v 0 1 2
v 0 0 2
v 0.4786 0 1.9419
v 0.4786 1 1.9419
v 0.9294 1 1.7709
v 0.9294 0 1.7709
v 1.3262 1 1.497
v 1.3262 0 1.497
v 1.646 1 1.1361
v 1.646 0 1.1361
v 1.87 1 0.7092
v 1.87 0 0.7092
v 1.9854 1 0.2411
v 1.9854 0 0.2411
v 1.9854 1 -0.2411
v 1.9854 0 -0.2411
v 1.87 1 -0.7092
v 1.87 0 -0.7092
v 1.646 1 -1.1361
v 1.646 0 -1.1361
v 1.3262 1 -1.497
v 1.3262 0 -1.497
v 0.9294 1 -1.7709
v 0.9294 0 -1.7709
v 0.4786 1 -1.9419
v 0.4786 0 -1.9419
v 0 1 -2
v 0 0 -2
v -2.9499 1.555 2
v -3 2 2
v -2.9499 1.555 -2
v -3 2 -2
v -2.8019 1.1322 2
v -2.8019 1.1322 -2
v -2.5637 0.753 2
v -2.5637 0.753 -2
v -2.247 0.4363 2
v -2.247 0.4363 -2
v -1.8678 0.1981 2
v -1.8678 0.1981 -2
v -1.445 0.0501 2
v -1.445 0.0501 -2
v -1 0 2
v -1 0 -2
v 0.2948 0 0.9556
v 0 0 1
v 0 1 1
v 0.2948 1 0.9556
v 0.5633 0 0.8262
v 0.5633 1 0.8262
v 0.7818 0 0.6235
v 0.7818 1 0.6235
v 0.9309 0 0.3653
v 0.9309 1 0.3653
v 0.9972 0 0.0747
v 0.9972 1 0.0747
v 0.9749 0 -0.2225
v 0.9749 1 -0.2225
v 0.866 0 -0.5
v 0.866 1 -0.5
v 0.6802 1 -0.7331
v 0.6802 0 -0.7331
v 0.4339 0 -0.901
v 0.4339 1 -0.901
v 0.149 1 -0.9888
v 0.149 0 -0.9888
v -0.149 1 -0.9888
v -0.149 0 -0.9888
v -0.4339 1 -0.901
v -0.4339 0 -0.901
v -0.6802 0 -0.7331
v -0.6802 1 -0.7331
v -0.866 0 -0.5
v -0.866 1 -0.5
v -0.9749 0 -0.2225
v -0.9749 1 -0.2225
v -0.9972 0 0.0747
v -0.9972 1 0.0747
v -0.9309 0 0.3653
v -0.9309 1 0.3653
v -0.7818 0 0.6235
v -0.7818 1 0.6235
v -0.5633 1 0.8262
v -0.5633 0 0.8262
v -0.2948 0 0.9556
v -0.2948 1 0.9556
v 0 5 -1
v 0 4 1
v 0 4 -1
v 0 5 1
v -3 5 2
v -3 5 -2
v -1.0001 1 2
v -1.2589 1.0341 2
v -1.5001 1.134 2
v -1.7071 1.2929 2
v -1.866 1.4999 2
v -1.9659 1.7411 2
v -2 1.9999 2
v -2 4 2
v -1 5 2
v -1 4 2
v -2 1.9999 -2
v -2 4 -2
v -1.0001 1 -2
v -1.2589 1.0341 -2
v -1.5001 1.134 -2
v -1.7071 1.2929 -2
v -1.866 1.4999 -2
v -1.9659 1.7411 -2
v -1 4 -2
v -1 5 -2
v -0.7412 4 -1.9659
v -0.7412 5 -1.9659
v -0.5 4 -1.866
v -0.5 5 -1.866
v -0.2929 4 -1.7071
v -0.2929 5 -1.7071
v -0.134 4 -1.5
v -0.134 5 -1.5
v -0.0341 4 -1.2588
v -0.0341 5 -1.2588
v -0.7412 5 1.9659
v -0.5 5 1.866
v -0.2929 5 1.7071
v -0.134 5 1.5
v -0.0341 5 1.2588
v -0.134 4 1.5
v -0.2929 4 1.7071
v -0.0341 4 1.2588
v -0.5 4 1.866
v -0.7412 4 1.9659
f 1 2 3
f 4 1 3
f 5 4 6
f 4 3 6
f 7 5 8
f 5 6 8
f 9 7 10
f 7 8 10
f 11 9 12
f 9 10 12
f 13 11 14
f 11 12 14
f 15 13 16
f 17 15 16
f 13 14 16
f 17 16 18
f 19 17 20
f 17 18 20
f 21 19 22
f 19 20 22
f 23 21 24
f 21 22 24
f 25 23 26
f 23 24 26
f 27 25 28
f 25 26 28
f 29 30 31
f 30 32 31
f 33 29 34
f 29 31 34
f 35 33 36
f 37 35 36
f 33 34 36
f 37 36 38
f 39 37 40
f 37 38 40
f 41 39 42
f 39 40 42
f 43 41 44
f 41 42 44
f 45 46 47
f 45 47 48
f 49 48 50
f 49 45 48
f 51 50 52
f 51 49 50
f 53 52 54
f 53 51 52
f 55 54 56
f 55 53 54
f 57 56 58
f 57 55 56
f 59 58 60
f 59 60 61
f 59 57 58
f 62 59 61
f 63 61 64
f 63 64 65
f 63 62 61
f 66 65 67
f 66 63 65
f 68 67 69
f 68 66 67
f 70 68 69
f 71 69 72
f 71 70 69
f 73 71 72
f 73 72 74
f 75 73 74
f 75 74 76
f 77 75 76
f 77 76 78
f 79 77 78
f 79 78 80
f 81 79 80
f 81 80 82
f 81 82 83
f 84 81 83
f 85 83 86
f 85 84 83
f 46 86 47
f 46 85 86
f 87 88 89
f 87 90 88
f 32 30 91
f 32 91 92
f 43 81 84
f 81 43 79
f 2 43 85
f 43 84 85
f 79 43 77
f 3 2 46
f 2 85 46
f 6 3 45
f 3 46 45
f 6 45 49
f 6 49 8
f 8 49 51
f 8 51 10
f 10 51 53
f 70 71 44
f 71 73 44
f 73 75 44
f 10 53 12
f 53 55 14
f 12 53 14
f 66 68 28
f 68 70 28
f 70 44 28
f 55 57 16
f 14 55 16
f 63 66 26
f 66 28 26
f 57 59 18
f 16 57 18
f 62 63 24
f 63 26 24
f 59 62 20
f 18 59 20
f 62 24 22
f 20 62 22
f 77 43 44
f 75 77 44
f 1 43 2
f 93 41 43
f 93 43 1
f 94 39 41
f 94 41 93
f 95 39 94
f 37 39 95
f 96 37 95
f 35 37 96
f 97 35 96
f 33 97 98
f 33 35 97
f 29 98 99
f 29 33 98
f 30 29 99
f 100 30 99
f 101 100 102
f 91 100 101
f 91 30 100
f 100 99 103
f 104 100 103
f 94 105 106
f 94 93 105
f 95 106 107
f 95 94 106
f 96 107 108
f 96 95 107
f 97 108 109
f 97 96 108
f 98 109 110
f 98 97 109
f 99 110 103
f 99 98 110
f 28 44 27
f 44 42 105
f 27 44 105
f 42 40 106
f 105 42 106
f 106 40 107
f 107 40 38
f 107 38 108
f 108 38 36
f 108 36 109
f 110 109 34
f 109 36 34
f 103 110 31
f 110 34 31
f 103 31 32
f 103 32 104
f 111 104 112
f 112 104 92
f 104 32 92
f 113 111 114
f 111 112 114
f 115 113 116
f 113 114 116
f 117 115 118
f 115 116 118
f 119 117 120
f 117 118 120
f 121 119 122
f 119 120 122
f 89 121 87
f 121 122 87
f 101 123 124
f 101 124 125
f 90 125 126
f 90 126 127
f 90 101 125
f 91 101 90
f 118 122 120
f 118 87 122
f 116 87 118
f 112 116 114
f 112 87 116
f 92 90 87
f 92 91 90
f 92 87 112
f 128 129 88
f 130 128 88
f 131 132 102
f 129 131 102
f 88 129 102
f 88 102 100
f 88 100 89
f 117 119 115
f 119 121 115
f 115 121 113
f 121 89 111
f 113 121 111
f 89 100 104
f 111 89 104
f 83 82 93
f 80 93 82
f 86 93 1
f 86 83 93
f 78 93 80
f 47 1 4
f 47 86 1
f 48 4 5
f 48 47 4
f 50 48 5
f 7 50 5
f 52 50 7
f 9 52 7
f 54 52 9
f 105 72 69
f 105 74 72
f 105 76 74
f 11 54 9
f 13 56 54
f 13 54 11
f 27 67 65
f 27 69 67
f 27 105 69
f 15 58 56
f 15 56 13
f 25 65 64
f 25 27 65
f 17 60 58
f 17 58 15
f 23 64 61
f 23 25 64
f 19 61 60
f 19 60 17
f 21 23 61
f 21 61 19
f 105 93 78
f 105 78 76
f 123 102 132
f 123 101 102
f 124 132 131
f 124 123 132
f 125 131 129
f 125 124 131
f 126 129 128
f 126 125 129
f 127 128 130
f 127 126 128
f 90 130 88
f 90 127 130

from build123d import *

# Parameters (mm, degrees)
SKETCH_1_R      = 1
EXTRUDE_1_DEPTH = 1
SKETCH_1_3_W    = 1
SKETCH_1_3_H    = 4
EXTRUDE_2_DEPTH = 5
SKETCH_2_W      = 4
SKETCH_2_H      = 1
EXTRUDE_3_DEPTH = 2
FILLET_1_R      = 1
FILLET_2_R      = 2
FILLET_3_R      = 1


with BuildPart() as part:
    # 草圖1 → 填料-伸長1 (new body)
    with BuildSketch(Plane(origin=(0, 0, 0), x_dir=(1, 0, 0), z_dir=(0, 1, 0))):
        with BuildLine():
            ThreePointArc((0, -2), (2, 0), (0, 2))
            Line((0, 2), (-2, 2))
            Line((-2, 2), (-2, -2))
            Line((-2, -2), (0, -2))
        make_face()
        with Locations(Location((0, 0, 0), (0, 0, 270))):
            Circle(SKETCH_1_R, mode=Mode.SUBTRACT)
    extrude(amount=EXTRUDE_1_DEPTH)

    # 草圖1<3> → 填料-伸長2 (add)
    with BuildSketch(Plane(origin=(0, 0, 0), x_dir=(1, 0, 0), z_dir=(0, 1, 0))):
        with Locations((-2.5, 0)):
            Rectangle(SKETCH_1_3_W, SKETCH_1_3_H)
    extrude(amount=EXTRUDE_2_DEPTH)

    # 草圖2 → 填料-伸長3 (add)
    with BuildSketch(Plane(origin=(-2, 0, 0), x_dir=(0, 0, -1), z_dir=(1, 0, 0))):
        with Locations((0, 4.5)):
            Rectangle(SKETCH_2_W, SKETCH_2_H)
    extrude(amount=EXTRUDE_3_DEPTH)

    # 圓角1
    fillet_1_edges = [part.edges().sort_by_distance(p)[0] for p in [
        (0, 4.5, 2),
        (0, 4.5, -2),
    ]]
    fillet(fillet_1_edges, radius=FILLET_1_R)

    # 圓角2
    fillet_2_edges = [part.edges().sort_by_distance(p)[0] for p in [
        (-3, 0, 0),
    ]]
    fillet(fillet_2_edges, radius=FILLET_2_R)

    # 圓角3
    fillet_3_edges = [part.edges().sort_by_distance(p)[0] for p in [
        (-2, 1, 0),
    ]]
    fillet(fillet_3_edges, radius=FILLET_3_R - 0.0001)  # a hair under: the kernel refuses the full size


solid = part.part
